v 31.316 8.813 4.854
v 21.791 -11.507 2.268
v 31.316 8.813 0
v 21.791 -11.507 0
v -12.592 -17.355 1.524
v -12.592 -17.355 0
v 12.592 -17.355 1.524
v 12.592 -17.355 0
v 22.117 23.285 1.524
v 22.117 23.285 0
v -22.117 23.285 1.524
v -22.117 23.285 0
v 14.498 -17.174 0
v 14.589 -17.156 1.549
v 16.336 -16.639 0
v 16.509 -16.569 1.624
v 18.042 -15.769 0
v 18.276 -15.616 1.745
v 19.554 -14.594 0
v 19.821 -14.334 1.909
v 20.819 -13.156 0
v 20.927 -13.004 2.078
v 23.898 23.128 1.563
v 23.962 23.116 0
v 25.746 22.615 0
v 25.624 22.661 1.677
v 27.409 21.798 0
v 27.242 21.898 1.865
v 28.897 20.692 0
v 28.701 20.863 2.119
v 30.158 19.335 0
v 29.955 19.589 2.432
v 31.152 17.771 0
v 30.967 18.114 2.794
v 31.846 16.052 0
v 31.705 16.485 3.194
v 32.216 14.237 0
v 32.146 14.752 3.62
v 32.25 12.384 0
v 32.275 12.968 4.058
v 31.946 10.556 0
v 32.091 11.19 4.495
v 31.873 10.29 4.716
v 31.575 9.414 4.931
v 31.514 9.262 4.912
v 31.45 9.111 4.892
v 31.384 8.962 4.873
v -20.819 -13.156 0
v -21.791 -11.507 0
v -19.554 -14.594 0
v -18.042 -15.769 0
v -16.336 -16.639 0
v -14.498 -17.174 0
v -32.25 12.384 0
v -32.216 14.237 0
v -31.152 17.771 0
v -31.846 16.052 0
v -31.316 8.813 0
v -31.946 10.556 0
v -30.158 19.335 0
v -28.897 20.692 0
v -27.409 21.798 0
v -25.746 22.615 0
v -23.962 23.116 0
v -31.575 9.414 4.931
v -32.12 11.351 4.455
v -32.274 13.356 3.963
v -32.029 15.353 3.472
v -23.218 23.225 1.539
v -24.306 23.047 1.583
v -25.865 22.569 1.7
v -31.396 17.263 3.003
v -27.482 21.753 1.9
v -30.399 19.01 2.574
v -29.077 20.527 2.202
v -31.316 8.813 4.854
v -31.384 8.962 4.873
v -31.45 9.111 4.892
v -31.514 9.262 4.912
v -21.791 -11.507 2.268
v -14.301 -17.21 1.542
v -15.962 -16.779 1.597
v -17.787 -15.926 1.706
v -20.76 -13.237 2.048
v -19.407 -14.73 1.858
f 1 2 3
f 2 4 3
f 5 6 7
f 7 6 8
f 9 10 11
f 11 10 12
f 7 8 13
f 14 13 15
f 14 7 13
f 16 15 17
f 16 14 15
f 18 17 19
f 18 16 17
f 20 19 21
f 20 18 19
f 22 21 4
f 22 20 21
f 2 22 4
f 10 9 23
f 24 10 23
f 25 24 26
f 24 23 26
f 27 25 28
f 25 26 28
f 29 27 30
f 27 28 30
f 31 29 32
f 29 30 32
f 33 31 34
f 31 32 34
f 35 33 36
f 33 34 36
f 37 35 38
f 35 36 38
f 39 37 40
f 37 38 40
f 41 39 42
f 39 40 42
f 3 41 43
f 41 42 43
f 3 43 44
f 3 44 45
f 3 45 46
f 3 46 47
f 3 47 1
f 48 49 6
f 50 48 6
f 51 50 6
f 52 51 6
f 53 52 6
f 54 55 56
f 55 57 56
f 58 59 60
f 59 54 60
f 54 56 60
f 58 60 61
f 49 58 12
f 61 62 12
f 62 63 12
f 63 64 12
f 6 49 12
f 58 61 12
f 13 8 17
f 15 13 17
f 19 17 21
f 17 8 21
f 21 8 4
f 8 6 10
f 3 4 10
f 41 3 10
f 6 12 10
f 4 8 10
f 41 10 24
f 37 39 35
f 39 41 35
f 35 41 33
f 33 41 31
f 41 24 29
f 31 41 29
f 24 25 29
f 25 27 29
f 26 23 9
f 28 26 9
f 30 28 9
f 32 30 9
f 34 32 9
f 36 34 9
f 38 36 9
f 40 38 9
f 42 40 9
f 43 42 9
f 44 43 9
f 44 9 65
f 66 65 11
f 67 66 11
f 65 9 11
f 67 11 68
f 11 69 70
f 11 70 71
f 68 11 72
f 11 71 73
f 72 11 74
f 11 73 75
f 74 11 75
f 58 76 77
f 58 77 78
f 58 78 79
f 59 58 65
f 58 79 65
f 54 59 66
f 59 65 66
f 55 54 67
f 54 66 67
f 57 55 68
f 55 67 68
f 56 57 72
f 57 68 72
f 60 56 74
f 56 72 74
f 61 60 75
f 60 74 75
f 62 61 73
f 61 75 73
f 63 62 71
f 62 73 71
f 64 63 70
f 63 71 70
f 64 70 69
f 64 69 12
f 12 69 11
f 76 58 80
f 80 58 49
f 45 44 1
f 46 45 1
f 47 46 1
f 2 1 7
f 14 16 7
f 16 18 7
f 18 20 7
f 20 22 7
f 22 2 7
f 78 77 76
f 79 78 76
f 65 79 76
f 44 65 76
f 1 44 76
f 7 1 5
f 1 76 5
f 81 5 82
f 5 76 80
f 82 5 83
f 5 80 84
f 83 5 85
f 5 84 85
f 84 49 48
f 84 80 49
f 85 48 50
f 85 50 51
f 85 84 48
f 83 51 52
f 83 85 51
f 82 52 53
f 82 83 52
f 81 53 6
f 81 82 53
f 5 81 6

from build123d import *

# Parameters (mm, degrees)
F1_DEPTH    = 5.08
F2_SIZE2    = 3.556
F2_SIZE     = 14.478
F3_T1_DEPTH = 183.3449978003
F4_R        = 10.16


# Not quite as in the source:
# - a fillet or chamfer that OpenCascade refuses, or shapes differently, is made with other operations: its cross-section is extruded or revolved along the edge and cut away or added


with BuildPart() as f1:
    # F0 (on Top) → F1 (new body)
    with BuildSketch(Plane.XY):
        Polygon((-38.1, 23.2852384394), (-19.05, -17.3547615606), (19.05, -17.3547615606), (38.1, 23.2852384394), align=None)
    extrude(amount=F1_DEPTH)

    # F2
    f2_edges = [f1.edges().sort_by_distance(p)[0] for p in [
        (0, 23.285238, 5.08),
    ]]
    f2_side = f1.faces().sort_by_distance((0, 5.223016, 5.08))[0]
    chamfer(f2_edges, length=F2_SIZE, length2=F2_SIZE2, reference=f2_side)

    # F3: chamfer of 27.94 x 3.556 on 1 edges, made by hand

    # F3_s2 → F3_t1 (cut)
    with BuildSketch(Plane.YZ.offset(-91.6724989001)):
        Polygon((10.5852384394, 5.08), (-17.3547615606, 1.524), (-17.3547615606, 5.08), align=None)
    extrude(amount=F3_T1_DEPTH, mode=Mode.SUBTRACT)

    # F4
    f4_edges = [f1.edges().sort_by_distance(p)[0] for p in [
        (19.05, -17.354762, 0.762),
        (-19.05, -17.354762, 0.762),
        (38.1, 23.285238, 0.762),
        (-38.1, 23.285238, 0.762),
    ]]
    fillet(f4_edges, radius=F4_R)


solid = f1.part
